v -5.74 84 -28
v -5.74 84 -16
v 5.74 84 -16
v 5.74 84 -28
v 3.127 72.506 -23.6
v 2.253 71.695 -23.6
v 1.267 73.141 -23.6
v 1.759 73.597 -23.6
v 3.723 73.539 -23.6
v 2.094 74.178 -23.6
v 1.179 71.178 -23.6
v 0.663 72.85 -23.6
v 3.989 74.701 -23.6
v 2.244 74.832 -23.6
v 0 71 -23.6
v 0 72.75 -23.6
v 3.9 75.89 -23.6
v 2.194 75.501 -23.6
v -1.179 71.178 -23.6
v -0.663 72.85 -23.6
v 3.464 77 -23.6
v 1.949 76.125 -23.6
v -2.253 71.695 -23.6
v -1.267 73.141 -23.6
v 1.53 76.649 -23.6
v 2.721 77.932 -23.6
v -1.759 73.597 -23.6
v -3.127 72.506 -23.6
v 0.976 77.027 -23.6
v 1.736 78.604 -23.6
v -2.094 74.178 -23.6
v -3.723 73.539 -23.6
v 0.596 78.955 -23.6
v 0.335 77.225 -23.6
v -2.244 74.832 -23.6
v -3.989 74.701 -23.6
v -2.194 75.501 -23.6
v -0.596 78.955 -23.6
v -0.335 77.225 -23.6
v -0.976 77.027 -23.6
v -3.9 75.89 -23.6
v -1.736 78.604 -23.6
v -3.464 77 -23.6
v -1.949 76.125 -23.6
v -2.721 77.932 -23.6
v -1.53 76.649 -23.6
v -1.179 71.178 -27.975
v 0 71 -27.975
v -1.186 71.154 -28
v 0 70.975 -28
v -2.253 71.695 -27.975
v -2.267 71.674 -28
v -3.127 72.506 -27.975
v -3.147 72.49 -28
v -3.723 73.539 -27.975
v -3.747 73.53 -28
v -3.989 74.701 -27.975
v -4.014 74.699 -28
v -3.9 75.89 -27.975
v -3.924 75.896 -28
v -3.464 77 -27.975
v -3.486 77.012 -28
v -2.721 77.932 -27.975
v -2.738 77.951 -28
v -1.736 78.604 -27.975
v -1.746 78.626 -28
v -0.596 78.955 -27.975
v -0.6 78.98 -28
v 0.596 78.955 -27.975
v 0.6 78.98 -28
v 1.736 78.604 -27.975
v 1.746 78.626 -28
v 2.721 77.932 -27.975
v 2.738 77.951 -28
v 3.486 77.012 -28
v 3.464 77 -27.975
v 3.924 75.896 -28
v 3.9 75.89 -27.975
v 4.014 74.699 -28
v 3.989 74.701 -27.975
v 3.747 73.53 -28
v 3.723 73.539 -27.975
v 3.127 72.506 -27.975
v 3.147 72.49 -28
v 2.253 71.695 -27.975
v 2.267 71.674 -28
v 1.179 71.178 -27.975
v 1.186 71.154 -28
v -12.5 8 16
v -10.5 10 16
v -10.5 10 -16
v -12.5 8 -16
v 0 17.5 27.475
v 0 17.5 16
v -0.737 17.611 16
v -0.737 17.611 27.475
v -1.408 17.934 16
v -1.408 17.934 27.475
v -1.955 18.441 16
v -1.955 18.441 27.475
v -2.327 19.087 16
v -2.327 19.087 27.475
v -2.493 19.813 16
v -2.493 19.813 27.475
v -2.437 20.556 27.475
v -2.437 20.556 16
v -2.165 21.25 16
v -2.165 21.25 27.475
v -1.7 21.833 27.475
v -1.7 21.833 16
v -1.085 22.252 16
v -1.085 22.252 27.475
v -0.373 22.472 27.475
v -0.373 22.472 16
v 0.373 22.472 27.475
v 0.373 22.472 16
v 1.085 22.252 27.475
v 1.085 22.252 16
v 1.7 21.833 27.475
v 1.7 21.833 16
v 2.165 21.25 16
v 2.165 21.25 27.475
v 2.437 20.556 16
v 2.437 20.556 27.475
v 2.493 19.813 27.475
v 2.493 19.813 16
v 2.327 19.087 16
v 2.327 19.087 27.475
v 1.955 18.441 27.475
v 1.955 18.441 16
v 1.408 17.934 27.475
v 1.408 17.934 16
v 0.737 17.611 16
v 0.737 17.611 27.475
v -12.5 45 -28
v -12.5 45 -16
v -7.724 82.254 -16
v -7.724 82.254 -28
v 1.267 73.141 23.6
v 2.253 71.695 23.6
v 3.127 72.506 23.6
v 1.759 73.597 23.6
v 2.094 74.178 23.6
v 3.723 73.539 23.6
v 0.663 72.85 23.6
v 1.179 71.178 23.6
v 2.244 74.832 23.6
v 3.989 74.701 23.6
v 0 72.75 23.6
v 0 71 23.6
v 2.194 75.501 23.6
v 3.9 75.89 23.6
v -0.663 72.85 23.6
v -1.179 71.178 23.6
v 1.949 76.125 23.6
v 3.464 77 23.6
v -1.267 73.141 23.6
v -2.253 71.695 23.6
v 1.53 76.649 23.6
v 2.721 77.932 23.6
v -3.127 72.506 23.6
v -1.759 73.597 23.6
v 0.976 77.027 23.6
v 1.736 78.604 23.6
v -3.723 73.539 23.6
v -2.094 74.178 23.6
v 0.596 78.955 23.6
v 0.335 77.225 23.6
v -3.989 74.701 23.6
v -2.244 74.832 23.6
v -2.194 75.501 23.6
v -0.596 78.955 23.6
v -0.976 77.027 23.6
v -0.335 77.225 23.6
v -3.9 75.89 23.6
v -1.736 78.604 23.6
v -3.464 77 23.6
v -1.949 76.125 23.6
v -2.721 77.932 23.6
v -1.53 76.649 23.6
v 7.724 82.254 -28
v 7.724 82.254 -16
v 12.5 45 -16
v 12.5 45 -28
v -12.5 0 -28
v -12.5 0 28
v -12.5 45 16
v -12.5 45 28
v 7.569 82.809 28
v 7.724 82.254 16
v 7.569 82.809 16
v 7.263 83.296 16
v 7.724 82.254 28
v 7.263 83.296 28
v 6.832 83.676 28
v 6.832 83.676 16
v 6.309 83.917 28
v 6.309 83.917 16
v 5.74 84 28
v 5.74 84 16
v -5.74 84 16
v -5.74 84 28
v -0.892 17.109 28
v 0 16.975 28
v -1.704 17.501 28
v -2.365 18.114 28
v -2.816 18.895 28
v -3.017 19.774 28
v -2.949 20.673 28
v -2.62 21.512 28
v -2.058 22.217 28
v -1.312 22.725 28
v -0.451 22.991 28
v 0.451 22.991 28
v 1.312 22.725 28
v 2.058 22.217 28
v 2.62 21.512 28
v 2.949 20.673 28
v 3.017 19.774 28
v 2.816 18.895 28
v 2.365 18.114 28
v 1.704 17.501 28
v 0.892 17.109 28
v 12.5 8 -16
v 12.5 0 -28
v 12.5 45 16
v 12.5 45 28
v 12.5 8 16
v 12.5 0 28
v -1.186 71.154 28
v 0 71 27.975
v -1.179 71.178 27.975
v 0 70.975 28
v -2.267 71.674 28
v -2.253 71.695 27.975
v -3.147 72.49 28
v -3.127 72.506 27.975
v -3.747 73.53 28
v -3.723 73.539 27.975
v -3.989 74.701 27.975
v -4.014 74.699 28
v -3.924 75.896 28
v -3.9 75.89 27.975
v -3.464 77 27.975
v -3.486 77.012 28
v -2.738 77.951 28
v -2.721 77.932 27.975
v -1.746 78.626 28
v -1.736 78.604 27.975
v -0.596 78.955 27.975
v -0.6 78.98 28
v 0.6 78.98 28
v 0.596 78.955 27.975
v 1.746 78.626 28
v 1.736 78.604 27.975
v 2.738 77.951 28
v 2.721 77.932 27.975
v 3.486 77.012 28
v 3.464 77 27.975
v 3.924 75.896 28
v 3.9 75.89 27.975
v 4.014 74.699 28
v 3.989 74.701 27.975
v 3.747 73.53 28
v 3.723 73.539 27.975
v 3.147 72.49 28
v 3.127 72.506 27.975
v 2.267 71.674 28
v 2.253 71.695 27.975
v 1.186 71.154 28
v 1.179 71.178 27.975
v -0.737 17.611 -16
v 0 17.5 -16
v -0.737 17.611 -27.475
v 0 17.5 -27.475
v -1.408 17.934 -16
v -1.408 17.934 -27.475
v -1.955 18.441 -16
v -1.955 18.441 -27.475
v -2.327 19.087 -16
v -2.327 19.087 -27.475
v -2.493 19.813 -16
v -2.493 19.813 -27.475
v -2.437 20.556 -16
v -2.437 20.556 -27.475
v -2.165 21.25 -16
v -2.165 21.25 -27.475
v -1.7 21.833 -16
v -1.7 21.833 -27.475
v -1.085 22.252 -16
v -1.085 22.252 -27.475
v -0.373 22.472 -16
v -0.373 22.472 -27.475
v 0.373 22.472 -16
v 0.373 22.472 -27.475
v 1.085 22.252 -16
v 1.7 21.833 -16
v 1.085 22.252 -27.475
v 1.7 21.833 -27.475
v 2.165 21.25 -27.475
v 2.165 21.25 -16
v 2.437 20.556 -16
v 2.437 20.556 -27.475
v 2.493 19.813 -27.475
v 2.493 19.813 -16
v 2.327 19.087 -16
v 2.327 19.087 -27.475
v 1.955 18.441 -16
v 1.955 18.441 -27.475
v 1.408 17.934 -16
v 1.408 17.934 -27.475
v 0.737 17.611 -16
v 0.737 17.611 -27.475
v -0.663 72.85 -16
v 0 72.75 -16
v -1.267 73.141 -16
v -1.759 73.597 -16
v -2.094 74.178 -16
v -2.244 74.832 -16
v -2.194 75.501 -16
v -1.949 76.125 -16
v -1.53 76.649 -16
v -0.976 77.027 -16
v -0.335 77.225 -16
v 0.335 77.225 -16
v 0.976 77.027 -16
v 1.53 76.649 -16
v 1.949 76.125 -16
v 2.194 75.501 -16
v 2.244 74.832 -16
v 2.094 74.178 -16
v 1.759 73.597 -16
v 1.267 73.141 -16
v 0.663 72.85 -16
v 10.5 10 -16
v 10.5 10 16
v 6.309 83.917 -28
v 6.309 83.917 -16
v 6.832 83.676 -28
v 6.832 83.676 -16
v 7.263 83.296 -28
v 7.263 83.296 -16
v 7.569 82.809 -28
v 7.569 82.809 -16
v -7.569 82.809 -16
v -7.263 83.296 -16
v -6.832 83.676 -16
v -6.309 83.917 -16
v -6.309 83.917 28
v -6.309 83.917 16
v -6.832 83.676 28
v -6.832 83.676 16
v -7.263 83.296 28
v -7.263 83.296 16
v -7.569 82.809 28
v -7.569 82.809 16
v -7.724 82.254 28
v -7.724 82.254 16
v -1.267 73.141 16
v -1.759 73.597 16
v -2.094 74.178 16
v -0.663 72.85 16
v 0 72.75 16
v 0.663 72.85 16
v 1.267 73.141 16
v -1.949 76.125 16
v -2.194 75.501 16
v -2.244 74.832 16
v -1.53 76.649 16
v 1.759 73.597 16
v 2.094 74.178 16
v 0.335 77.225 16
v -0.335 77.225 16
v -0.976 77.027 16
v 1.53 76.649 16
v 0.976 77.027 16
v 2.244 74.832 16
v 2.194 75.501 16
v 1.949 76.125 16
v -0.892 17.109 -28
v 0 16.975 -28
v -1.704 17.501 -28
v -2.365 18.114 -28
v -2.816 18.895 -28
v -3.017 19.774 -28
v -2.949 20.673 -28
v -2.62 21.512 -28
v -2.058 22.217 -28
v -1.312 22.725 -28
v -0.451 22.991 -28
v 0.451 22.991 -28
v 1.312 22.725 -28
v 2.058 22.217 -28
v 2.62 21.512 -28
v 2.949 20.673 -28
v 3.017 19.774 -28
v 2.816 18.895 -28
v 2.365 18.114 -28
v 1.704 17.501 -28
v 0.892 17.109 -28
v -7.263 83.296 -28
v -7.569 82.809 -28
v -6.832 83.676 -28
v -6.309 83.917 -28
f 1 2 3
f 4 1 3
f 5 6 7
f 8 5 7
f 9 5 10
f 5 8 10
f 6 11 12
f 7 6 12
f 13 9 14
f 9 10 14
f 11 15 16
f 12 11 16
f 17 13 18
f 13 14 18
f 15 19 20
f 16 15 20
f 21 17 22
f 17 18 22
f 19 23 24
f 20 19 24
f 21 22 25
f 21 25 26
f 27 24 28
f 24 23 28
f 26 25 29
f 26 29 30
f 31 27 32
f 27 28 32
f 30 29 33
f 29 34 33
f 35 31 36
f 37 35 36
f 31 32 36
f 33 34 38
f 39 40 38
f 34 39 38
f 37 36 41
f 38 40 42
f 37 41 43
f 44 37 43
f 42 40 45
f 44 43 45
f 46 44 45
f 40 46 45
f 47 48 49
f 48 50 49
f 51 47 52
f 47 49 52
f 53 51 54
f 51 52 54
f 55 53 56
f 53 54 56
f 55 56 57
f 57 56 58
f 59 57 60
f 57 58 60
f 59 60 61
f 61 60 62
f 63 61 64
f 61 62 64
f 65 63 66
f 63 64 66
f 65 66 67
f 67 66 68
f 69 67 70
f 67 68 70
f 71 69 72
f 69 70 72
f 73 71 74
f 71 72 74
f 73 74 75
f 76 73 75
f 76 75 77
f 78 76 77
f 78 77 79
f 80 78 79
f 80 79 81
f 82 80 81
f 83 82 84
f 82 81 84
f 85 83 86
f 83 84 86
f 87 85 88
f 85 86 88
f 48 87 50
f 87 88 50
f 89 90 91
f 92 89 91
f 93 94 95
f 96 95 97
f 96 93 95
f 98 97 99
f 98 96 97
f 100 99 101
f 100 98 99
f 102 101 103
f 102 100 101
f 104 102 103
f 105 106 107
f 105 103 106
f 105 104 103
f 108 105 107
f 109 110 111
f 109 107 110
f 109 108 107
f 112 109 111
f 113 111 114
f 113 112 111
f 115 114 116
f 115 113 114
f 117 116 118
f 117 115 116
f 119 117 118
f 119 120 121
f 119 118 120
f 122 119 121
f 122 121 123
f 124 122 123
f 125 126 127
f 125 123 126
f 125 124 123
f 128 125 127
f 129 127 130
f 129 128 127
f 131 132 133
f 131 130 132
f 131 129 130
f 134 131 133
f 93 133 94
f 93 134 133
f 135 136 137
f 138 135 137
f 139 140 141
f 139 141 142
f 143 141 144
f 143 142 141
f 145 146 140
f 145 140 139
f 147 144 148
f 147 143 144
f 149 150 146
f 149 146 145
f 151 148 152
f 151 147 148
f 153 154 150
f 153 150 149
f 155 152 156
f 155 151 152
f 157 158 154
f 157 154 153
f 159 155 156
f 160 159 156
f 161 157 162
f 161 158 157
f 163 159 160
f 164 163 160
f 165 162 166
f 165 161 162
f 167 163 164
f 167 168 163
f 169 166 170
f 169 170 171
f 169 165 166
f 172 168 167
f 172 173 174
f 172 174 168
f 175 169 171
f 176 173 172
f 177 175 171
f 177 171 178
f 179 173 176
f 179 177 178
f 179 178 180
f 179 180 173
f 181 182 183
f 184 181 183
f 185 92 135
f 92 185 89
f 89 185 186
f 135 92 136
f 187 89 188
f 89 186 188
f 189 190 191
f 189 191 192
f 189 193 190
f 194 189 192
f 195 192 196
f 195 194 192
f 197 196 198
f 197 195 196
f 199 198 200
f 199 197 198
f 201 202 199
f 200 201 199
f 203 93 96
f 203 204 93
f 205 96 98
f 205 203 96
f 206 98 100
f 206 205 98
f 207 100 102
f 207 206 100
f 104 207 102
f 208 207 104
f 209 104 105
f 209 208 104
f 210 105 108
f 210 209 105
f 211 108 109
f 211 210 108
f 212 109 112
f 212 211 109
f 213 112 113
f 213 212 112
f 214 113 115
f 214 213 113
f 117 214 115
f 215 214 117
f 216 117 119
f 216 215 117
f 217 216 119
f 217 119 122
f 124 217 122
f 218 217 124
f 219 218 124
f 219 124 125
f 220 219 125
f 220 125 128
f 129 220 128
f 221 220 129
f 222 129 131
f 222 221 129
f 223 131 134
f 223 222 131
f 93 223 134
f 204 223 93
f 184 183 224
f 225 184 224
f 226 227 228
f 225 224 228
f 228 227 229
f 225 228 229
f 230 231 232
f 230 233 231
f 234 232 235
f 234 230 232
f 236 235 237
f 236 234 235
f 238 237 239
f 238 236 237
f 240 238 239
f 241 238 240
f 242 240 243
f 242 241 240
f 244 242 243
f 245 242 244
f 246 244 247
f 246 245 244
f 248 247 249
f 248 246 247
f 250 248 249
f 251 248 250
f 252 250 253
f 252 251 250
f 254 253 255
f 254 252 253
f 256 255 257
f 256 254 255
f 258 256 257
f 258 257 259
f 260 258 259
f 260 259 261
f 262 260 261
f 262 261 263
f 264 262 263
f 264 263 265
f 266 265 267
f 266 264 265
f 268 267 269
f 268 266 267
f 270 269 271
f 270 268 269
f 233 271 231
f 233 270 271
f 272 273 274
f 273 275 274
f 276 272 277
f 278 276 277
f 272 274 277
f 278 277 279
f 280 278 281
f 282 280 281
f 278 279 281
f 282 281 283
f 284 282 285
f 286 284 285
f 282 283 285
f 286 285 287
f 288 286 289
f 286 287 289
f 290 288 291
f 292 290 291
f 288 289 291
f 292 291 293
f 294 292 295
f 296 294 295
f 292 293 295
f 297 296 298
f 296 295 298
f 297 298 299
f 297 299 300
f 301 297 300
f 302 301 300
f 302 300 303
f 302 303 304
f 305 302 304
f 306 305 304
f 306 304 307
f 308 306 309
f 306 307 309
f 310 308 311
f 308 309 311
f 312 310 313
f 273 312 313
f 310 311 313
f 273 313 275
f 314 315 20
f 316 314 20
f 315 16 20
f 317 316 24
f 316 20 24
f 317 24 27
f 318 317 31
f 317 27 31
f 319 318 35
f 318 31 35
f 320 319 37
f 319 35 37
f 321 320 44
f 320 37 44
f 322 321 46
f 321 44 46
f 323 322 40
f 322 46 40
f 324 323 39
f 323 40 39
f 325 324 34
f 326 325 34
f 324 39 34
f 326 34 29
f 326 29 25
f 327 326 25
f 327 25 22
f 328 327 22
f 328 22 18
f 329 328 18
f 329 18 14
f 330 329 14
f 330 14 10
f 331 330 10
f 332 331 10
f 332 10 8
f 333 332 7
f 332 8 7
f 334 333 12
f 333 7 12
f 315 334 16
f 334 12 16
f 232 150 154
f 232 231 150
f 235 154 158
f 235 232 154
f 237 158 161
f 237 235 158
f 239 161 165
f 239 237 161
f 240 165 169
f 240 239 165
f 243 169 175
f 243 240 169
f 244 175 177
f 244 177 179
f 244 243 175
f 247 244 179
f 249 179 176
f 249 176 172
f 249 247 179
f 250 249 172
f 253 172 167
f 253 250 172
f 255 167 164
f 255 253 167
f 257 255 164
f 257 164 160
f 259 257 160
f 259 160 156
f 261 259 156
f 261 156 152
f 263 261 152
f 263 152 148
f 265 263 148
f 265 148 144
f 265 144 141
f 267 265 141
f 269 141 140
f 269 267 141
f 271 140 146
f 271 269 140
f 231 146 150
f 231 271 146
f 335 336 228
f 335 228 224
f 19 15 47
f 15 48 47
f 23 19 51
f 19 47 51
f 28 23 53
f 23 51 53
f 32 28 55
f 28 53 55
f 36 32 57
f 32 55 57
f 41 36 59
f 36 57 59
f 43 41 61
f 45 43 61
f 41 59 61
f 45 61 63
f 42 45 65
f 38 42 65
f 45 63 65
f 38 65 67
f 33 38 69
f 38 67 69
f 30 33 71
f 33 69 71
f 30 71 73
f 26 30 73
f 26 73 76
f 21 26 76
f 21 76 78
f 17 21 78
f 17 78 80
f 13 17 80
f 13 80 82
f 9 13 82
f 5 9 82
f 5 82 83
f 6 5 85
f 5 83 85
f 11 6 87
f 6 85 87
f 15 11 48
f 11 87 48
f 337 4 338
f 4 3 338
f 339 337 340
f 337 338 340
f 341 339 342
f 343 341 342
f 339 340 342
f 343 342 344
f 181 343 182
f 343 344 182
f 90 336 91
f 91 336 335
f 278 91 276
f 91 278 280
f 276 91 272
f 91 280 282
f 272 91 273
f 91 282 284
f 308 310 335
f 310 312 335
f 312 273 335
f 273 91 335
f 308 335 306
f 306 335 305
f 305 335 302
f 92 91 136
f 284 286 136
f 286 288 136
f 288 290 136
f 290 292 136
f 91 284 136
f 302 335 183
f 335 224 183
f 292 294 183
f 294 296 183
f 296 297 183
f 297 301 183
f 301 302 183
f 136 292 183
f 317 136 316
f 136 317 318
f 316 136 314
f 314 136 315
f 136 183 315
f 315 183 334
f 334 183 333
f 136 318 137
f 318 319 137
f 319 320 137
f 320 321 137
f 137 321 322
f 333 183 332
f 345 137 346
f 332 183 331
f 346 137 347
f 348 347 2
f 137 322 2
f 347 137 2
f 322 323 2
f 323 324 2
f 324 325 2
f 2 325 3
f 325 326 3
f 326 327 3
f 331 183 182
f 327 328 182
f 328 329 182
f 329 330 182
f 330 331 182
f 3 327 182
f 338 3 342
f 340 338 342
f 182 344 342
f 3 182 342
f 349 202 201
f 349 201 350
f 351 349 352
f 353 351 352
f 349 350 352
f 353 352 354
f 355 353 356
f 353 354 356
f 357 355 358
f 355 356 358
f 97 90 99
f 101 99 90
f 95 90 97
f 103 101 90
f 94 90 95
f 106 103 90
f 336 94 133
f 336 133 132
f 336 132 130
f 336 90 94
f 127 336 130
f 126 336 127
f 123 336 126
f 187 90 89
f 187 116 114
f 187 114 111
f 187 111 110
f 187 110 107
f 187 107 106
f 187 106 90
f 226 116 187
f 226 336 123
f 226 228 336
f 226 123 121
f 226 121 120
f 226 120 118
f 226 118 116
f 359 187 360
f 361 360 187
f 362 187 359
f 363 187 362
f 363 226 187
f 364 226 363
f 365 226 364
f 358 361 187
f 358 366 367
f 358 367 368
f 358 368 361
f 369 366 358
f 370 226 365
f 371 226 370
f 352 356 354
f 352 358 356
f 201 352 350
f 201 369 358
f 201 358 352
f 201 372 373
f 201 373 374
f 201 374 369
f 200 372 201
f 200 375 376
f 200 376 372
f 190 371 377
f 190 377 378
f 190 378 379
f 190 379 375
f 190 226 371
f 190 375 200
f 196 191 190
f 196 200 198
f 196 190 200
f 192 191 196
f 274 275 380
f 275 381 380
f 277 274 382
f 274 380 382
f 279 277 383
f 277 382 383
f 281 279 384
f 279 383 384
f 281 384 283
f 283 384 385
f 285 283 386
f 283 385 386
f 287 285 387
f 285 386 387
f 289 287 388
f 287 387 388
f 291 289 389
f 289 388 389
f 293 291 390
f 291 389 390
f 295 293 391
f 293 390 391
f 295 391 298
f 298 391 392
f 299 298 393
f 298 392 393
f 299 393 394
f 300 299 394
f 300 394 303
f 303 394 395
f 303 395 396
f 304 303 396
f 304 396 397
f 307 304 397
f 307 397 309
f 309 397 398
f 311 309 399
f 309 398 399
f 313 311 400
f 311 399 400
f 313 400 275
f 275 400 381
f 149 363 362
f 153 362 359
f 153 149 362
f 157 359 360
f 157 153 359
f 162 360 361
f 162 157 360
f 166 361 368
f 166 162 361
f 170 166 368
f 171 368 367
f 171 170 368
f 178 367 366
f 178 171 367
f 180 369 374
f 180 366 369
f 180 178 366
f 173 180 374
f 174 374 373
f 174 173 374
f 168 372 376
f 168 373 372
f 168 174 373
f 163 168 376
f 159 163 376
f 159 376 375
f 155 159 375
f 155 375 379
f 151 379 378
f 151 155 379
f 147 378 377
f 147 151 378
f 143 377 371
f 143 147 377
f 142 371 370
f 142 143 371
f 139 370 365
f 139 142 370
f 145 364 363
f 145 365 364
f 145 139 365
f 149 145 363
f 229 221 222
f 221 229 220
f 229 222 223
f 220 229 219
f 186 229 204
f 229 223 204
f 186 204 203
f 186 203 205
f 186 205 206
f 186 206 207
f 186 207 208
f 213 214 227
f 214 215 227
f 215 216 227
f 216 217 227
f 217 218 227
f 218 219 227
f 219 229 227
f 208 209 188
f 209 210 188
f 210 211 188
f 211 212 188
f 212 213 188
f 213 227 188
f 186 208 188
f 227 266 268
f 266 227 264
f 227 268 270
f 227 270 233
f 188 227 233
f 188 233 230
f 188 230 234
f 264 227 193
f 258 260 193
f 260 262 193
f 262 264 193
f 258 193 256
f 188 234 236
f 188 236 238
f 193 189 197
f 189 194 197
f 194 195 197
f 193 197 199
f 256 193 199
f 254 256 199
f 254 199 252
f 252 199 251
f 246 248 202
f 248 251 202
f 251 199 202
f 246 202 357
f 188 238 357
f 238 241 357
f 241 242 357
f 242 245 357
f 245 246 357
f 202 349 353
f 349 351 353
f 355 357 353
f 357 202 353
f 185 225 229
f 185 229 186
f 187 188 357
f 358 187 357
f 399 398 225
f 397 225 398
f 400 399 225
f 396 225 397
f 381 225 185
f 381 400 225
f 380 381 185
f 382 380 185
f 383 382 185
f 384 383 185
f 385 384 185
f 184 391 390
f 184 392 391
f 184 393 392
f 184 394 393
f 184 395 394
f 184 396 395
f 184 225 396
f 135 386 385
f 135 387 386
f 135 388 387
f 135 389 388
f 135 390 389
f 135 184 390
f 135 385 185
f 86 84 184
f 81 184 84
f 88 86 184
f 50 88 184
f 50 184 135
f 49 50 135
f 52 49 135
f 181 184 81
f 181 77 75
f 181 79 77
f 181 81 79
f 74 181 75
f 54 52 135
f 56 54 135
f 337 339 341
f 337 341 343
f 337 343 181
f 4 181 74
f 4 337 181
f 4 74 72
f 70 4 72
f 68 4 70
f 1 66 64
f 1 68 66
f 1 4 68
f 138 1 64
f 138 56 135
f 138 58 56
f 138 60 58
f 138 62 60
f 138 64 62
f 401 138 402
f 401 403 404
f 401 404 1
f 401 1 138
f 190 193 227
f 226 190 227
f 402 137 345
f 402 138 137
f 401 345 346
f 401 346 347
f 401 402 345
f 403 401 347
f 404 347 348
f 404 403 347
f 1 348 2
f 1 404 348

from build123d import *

# Parameters (mm, degrees)
BOSS_EXTRUDE1_DEPTH = 28
SKETCH2_W           = 32
SKETCH2_H           = 74
CUT_EXTRUDE1_DEPTH  = 93.005434622
CHAMFER1_SIZE       = 2
FILLET1_R           = 2


with BuildPart() as part:
    # Sketch1 → Boss-Extrude1 (new, symmetric)
    with BuildSketch(Plane.XY):
        Polygon((12.5, 0), (-12.5, 0), (-12.5, 45), (-7.5, 84), (7.5, 84), (12.5, 45), align=None)
    extrude(amount=BOSS_EXTRUDE1_DEPTH, both=True)

    # Sketch2 → Cut-Extrude1 (cut, through all)
    with BuildSketch(Plane(origin=(12.5, 0, 0), x_dir=(0, 0, -1), z_dir=(1, 0, 0))):
        with Locations((0, 47)):
            Rectangle(SKETCH2_W, SKETCH2_H)
    extrude(amount=-CUT_EXTRUDE1_DEPTH, mode=Mode.SUBTRACT)

    # Sketch7 → CBORE for M4 Hex Socket Head Cap Screw1 (revolve, cut)
    with BuildSketch(Plane(origin=(0, 75, 28), x_dir=(0, -1, 0), z_dir=(1, 0, 0))):
        Polygon((0, 0), (0, 21.351936393), (2.25, 20), (2.25, 4.4), (4, 4.4), (4, 0.025), (4.025, 0), align=None)
    cbore_for_m4_hex_socket_head_cap_screw1 = revolve(axis=Axis((0, 75, 34.35), (0, 0, -1)), mode=Mode.SUBTRACT)

    # Mirror1: CBORE for M4 Hex Socket Head Cap Screw1 across plane
    add(cbore_for_m4_hex_socket_head_cap_screw1.mirror(Plane.XY), mode=Mode.SUBTRACT)

    # Sketch9 → M6 Tapped Hole1 (revolve, cut)
    with BuildSketch(Plane(origin=(0, 20, 28), x_dir=(0, -1, 0), z_dir=(1, 0, 0))):
        Polygon((0, 0), (0, 28.502151548), (2.5, 27), (2.5, 0.525), (3.025, 0), align=None)
    m6_tapped_hole1 = revolve(axis=Axis((0, 20, 34.35), (0, 0, -1)), mode=Mode.SUBTRACT)

    # Chamfer1
    chamfer1_edges = [part.edges().sort_by_distance(p)[0] for p in [
        (12.5, 10, 0),
        (-12.5, 10, 0),
    ]]
    chamfer(chamfer1_edges, length=CHAMFER1_SIZE)

    # Fillet1
    fillet1_edges = [part.edges().sort_by_distance(p)[0] for p in [
        (-7.5, 84, 22),
        (7.5, 84, 22),
        (-7.5, 84, -22),
        (7.5, 84, -22),
    ]]
    fillet(fillet1_edges, radius=FILLET1_R)

    # Mirror2: M6 Tapped Hole1 across plane
    add(m6_tapped_hole1.mirror(Plane.XY), mode=Mode.SUBTRACT)


solid = part.part
